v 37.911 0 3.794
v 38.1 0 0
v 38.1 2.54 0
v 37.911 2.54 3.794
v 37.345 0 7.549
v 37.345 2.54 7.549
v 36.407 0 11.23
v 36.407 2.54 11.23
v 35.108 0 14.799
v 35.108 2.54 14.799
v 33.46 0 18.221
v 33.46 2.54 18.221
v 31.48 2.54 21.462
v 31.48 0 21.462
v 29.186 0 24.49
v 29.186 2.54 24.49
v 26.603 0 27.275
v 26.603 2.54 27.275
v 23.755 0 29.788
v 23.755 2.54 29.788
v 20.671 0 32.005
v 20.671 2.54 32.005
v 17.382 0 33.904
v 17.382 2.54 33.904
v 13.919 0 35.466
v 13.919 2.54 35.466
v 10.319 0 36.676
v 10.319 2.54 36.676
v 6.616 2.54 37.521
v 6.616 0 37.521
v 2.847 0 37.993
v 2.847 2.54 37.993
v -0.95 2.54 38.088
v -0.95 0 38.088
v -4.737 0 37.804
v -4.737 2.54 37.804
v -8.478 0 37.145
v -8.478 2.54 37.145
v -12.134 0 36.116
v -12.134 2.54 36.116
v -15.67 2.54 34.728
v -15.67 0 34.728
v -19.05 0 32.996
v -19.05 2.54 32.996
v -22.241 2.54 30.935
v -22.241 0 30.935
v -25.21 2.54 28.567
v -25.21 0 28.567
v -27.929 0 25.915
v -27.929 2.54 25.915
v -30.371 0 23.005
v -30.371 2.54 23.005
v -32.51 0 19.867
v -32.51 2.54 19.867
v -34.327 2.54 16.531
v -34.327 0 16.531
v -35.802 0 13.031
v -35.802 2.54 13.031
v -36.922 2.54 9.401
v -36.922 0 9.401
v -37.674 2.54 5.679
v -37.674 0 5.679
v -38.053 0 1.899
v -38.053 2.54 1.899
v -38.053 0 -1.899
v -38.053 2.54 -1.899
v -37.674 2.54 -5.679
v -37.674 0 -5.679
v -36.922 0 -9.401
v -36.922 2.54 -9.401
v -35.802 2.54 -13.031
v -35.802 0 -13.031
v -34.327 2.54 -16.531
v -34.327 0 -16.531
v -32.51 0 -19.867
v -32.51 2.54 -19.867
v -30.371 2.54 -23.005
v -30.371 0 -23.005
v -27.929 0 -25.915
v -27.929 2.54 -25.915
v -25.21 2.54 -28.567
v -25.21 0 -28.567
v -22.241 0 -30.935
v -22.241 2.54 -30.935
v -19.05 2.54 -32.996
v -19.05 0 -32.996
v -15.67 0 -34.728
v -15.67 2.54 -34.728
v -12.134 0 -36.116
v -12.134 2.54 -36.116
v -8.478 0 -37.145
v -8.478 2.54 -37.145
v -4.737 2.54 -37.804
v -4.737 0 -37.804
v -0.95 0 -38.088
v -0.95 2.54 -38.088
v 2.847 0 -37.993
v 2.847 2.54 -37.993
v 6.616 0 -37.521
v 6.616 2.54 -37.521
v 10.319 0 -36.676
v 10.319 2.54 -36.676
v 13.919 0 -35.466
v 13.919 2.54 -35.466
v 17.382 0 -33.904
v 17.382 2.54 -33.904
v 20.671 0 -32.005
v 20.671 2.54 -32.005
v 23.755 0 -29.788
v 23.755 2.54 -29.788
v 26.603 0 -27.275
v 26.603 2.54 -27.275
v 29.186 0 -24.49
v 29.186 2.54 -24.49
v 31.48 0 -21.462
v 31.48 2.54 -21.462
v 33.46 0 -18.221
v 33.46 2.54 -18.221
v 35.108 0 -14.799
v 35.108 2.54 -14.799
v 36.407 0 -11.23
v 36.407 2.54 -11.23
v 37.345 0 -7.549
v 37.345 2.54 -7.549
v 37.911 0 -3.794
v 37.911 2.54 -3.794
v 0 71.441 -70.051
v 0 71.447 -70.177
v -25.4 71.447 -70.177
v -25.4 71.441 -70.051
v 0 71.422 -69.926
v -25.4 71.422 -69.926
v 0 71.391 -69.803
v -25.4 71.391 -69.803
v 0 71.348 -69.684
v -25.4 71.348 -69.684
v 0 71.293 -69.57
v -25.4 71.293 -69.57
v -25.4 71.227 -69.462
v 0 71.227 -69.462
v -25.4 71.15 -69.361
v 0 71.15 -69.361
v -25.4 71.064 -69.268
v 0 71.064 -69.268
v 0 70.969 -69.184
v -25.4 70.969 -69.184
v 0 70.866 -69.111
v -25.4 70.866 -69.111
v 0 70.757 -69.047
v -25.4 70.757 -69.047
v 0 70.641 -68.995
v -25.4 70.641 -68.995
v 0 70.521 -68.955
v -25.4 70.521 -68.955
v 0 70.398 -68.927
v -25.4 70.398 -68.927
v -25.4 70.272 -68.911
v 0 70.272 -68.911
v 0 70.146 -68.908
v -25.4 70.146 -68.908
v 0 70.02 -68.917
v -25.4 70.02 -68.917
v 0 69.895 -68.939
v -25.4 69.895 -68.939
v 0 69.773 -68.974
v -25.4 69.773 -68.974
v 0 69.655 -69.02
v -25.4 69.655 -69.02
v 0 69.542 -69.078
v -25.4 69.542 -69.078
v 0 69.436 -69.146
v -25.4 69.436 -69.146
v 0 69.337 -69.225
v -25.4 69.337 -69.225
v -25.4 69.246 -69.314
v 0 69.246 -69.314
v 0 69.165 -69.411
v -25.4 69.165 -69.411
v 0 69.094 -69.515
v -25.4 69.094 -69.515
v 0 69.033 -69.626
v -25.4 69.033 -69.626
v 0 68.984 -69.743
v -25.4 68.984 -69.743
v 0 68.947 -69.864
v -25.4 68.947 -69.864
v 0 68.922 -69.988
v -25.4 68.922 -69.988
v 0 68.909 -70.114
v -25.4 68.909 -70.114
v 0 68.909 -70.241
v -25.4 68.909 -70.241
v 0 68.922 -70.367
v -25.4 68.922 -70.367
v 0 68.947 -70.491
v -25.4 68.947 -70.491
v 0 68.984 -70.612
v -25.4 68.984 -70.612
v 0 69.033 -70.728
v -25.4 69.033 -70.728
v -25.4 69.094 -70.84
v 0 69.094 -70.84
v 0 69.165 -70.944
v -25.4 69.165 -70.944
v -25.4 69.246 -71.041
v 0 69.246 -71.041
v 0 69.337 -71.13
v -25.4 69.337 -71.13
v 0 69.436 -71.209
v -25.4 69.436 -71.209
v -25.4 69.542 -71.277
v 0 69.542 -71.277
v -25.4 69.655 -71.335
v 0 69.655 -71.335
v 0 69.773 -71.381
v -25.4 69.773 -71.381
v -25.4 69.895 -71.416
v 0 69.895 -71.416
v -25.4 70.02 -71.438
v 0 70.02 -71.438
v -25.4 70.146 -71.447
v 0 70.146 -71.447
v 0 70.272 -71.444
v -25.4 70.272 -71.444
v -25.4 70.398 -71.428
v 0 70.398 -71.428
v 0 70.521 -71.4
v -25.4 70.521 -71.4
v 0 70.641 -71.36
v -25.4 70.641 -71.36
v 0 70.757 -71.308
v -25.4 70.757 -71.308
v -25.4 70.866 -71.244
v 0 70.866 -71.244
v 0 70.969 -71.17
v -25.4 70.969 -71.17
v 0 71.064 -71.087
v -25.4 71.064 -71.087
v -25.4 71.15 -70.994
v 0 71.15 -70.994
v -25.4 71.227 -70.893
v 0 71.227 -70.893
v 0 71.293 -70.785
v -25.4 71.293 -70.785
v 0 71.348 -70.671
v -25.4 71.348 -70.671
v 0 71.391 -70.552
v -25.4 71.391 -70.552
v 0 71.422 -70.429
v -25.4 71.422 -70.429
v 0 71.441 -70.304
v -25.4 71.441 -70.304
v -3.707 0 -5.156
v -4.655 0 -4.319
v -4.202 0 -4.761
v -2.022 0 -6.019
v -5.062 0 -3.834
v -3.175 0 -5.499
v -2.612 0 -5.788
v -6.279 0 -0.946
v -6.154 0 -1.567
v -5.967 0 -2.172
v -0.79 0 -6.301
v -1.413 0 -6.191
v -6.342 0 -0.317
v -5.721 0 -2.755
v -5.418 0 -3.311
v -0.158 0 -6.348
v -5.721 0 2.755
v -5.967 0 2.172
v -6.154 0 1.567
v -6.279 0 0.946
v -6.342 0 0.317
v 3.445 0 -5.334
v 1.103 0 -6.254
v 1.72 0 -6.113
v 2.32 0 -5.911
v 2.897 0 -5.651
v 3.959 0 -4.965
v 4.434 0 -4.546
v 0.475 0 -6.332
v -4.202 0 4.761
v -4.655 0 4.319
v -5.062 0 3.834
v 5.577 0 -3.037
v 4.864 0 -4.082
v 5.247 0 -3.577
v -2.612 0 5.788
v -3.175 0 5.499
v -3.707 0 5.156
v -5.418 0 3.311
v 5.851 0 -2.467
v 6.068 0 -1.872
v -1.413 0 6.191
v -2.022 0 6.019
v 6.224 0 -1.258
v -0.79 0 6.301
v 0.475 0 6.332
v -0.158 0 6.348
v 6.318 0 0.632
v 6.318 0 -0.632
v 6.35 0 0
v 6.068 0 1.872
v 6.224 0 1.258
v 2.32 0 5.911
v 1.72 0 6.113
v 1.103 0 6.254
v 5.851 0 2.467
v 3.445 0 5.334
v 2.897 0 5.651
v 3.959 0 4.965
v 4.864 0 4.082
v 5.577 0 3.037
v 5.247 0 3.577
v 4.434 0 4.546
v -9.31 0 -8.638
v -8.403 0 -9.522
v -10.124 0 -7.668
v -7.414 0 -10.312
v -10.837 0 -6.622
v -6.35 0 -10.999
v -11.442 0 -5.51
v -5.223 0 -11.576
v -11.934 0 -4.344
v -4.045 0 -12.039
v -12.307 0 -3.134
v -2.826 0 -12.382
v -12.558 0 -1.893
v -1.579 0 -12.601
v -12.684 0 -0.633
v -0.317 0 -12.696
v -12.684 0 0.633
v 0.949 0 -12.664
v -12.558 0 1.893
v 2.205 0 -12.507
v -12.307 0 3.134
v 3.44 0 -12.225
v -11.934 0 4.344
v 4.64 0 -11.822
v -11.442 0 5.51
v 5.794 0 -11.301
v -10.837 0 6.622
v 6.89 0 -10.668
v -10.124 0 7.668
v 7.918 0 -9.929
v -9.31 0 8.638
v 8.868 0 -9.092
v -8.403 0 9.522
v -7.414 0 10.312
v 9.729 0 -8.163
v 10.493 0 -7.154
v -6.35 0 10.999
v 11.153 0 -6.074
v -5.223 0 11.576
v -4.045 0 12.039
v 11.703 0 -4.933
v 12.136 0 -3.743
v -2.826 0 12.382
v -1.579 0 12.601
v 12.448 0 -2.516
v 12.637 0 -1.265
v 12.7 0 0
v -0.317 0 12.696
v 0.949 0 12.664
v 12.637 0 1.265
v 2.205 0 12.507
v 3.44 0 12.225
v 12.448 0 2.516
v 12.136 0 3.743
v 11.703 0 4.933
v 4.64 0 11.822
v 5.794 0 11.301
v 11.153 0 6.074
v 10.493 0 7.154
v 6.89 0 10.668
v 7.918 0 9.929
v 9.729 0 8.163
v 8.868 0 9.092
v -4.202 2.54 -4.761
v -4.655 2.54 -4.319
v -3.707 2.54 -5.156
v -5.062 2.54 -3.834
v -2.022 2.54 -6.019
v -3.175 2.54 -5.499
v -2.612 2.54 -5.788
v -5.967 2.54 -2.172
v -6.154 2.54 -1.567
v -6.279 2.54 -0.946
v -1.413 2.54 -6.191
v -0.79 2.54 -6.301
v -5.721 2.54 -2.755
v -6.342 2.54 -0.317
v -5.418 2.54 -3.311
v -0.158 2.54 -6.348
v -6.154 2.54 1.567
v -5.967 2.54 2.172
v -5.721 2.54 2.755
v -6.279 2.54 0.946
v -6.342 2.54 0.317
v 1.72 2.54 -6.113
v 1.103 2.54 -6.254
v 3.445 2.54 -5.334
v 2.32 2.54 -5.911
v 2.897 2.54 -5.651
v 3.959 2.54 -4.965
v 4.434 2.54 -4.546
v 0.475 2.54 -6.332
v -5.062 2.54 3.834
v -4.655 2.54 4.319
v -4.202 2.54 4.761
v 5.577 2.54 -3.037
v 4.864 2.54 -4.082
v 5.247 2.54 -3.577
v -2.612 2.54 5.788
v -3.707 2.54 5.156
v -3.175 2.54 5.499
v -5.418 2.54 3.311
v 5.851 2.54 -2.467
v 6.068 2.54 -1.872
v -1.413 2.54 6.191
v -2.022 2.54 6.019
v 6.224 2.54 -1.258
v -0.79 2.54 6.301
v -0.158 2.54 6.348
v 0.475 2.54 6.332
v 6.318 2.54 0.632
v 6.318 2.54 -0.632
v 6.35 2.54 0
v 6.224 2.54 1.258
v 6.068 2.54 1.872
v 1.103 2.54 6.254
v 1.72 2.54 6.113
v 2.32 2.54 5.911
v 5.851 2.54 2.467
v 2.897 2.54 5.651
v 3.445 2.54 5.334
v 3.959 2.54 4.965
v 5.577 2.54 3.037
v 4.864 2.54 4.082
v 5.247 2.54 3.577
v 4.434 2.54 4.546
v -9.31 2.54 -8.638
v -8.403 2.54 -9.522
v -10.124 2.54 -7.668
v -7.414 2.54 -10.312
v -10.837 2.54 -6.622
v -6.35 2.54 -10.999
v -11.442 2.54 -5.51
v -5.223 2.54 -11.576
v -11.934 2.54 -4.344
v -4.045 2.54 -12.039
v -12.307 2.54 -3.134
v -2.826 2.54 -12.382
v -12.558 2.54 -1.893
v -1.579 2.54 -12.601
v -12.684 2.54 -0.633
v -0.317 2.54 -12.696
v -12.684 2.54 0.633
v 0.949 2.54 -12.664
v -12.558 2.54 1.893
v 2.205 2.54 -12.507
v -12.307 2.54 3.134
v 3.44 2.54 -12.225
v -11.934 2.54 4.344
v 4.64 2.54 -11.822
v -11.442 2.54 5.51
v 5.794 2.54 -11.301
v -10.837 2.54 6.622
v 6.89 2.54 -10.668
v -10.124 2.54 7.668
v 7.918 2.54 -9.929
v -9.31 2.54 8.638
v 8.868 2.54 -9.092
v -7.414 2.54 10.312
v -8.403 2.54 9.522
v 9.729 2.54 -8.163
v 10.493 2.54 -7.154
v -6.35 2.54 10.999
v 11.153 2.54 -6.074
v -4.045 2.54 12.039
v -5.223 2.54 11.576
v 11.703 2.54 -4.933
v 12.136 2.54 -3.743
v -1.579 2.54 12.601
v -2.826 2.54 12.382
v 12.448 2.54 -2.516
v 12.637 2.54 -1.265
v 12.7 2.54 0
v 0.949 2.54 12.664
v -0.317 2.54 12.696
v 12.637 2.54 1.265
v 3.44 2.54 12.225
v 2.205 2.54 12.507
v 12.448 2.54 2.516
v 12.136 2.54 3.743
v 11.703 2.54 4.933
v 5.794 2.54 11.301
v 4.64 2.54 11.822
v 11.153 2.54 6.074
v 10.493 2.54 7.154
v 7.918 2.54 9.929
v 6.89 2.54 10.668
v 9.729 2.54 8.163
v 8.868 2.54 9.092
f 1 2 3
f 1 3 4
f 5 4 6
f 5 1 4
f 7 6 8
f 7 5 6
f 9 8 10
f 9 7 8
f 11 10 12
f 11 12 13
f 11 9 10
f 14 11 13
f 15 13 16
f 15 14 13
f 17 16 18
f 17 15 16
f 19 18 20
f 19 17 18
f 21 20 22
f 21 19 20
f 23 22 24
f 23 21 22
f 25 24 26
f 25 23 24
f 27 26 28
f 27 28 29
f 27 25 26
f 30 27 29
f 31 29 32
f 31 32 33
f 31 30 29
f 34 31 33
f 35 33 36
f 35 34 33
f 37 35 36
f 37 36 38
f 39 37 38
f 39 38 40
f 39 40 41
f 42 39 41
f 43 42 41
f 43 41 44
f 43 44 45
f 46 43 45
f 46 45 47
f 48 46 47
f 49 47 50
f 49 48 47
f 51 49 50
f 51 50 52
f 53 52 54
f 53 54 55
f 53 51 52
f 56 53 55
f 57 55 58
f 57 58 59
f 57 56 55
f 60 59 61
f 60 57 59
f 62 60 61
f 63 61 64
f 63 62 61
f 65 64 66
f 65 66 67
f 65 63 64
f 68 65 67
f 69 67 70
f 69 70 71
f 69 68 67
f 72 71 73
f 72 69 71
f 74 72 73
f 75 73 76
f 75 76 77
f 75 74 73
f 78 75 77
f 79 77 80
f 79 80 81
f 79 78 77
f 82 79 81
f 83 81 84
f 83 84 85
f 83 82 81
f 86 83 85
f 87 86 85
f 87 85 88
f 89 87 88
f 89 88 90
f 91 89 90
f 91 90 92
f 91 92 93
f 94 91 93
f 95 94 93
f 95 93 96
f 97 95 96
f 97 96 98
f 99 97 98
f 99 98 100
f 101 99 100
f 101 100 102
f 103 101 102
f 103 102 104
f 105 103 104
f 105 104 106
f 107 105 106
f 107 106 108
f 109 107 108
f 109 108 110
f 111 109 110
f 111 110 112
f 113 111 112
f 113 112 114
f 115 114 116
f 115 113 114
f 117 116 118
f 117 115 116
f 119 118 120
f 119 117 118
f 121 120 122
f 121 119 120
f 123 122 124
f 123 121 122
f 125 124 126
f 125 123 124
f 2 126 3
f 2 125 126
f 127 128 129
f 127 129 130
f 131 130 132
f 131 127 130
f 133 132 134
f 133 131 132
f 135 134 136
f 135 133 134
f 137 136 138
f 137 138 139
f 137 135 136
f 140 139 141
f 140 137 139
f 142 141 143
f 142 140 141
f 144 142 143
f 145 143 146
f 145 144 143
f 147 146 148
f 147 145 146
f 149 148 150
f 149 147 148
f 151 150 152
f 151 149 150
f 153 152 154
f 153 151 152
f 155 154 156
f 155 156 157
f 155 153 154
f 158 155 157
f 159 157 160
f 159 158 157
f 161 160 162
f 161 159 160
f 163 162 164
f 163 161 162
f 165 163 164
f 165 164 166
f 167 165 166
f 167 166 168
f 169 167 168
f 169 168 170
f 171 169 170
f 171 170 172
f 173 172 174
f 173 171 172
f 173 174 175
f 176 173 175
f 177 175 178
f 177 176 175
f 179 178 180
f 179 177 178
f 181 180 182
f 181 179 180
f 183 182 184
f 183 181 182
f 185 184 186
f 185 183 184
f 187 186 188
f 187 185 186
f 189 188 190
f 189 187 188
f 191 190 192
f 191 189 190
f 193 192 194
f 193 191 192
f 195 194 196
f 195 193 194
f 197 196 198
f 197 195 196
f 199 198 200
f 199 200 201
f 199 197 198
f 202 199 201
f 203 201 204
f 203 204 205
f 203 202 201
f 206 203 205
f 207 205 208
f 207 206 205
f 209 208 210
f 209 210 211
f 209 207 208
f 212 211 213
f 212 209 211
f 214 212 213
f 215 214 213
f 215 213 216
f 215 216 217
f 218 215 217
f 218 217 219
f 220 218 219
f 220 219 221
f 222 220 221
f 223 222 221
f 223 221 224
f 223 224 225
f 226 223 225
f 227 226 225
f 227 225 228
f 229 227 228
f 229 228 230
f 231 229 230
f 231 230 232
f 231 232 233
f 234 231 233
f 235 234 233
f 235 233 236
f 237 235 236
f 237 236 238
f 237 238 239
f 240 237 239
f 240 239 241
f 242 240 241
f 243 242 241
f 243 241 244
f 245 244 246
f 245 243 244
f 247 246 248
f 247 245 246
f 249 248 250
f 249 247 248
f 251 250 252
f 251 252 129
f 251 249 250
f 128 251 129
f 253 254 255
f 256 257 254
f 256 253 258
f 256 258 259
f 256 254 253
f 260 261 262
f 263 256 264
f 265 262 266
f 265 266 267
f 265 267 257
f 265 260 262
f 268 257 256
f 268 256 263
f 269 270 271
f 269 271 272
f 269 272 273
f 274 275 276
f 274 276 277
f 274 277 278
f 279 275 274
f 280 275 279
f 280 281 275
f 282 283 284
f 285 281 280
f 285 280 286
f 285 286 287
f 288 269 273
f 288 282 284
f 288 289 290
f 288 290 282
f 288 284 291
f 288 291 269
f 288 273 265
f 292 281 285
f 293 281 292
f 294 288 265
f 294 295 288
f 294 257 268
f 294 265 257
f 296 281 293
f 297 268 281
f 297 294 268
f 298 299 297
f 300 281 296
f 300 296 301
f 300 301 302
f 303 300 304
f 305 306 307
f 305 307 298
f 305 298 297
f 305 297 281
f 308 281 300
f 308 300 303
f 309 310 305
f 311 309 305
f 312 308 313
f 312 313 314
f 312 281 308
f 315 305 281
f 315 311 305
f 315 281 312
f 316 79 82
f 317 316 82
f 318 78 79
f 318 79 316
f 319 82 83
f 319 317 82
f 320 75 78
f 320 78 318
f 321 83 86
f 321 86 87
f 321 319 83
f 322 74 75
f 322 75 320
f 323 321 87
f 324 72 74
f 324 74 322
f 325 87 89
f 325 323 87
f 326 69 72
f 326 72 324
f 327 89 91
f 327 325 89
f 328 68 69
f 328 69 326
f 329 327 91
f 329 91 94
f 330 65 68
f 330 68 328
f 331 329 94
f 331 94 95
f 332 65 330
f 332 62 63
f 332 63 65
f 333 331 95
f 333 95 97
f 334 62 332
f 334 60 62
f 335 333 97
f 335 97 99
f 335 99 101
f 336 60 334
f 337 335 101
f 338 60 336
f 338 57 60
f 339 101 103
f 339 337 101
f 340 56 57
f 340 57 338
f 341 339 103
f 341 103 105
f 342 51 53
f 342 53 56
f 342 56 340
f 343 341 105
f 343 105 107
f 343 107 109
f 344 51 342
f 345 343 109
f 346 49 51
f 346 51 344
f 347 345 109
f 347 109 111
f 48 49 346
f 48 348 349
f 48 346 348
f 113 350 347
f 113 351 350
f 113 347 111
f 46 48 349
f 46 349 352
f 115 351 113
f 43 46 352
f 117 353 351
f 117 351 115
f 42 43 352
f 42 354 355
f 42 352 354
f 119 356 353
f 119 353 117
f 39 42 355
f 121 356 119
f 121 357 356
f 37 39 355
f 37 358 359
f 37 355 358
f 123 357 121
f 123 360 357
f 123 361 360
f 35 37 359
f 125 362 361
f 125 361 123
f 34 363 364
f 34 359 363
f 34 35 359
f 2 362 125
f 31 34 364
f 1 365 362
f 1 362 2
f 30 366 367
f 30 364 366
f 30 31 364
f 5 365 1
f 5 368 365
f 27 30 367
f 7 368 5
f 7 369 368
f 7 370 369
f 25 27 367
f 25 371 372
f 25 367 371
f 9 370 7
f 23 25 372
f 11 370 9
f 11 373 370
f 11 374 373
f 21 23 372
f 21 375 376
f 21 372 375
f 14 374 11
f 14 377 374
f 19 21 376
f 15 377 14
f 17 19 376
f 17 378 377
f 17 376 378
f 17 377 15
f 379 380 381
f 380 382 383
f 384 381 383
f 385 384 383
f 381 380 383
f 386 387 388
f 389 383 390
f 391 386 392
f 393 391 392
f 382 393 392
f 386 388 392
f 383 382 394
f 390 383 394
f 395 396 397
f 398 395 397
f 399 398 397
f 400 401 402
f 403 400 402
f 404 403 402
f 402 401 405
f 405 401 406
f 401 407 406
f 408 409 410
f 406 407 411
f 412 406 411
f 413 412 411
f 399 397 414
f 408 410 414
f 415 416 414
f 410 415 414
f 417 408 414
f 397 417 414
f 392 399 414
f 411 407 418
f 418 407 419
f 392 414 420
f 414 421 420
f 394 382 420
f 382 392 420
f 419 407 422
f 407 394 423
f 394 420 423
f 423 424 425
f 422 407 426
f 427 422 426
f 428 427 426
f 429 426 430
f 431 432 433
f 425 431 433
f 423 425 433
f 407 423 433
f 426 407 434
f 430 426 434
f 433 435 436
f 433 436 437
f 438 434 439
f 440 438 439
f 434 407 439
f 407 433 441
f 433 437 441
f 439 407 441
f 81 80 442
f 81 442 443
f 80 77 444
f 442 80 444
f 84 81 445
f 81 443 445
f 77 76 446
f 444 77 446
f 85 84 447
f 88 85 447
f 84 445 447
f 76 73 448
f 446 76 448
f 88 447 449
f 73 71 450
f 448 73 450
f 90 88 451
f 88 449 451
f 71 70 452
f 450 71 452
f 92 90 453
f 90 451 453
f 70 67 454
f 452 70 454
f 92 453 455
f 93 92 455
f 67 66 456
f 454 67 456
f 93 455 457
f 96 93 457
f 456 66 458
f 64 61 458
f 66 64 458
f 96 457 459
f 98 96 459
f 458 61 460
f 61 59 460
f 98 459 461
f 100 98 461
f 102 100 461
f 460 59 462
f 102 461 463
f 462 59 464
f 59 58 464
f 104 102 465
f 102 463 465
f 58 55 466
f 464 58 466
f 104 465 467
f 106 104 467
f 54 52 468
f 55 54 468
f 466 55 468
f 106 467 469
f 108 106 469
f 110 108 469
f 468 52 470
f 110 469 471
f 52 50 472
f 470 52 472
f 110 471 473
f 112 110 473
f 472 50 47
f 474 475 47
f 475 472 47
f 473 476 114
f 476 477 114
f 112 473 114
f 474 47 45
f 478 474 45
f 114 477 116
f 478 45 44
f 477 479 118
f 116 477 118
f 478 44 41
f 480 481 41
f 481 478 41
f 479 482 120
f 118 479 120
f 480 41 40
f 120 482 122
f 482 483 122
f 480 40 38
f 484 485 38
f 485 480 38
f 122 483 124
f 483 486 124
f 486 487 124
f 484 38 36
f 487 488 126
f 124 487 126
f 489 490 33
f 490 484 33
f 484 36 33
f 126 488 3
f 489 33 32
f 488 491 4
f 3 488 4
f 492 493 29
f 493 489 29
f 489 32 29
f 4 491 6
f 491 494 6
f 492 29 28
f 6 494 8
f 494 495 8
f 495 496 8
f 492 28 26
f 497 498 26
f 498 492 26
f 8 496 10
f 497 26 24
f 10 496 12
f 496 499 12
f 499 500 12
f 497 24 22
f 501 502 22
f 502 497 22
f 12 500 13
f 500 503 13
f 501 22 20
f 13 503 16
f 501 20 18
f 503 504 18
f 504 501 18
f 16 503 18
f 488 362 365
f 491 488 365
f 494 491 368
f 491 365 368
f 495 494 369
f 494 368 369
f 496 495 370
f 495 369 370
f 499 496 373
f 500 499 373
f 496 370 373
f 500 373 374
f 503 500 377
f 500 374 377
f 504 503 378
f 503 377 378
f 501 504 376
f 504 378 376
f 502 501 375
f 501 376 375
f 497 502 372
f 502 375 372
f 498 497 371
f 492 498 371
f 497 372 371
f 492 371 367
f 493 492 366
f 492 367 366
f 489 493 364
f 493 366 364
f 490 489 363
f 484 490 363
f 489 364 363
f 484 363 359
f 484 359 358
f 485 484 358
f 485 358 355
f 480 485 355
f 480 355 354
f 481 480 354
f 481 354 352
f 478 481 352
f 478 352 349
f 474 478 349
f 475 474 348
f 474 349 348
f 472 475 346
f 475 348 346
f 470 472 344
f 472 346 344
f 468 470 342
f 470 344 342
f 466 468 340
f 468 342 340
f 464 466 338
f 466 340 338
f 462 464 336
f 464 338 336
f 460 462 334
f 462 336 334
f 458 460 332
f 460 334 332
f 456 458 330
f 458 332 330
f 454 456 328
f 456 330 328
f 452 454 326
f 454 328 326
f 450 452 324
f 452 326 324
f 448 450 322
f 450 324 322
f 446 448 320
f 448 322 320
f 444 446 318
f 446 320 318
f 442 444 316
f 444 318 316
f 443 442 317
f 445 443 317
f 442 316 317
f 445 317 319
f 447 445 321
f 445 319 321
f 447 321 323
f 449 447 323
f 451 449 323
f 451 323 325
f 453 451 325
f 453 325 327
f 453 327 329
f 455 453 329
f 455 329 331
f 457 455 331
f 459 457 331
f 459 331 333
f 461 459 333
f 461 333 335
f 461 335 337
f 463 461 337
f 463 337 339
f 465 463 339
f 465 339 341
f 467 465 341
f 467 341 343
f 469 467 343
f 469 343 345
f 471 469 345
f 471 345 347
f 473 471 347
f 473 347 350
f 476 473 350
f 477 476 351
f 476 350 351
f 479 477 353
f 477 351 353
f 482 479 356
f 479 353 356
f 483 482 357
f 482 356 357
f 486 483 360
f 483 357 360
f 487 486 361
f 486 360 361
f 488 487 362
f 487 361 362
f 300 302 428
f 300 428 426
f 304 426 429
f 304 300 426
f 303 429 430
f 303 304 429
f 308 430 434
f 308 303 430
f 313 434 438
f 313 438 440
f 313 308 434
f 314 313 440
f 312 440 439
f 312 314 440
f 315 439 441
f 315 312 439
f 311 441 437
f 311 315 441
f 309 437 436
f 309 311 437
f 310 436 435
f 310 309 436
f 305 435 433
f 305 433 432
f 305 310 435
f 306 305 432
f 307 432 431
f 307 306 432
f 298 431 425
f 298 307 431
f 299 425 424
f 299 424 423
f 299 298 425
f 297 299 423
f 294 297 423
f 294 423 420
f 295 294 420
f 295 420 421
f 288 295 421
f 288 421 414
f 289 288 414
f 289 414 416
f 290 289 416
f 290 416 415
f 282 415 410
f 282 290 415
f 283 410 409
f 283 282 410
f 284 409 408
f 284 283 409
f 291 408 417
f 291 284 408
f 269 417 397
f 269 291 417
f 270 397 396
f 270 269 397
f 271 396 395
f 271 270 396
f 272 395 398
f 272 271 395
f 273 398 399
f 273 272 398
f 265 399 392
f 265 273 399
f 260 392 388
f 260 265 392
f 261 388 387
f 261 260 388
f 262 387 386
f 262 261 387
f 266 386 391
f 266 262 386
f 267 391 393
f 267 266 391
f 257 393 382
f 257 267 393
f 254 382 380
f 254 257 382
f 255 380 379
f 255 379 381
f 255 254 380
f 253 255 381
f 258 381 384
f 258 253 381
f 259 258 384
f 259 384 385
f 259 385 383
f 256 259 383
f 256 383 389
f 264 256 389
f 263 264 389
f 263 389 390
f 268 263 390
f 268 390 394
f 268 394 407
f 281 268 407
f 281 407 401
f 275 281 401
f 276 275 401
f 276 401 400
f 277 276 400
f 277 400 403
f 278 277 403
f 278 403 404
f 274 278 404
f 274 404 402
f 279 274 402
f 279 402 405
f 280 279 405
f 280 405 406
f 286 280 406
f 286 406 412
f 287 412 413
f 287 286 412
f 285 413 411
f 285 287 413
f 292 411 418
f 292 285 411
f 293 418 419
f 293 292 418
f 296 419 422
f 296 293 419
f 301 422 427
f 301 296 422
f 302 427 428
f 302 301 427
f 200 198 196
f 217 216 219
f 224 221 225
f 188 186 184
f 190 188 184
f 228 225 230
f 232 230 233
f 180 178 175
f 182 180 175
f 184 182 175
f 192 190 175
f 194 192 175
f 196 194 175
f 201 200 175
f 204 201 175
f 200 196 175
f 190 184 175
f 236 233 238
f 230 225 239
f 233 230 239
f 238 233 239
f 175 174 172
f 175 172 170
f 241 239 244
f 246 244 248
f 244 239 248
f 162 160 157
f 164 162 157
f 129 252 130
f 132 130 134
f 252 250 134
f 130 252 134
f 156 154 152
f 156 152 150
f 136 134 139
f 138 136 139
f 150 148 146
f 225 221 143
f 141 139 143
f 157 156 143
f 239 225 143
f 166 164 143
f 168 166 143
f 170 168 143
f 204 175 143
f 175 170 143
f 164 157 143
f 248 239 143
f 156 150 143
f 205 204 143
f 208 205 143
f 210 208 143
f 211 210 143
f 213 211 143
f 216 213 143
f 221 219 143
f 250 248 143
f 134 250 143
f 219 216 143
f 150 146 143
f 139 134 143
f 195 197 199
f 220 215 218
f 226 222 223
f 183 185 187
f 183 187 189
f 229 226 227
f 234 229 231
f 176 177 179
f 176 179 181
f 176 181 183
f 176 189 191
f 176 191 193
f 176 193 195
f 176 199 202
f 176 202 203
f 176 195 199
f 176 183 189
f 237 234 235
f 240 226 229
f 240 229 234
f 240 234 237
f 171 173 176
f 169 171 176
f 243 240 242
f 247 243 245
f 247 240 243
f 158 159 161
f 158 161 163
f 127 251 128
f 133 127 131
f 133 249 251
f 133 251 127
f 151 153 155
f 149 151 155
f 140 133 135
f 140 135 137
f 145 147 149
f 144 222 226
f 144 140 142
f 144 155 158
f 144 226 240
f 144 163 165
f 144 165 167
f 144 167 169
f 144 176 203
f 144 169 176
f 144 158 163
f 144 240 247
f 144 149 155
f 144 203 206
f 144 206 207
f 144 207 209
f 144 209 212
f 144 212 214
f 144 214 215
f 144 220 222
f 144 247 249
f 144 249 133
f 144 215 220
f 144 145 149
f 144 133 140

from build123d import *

# Parameters (mm, degrees)
F0_R     = 38.1
F0_R_2   = 12.7
F0_R_3   = 6.35
F1_DEPTH = 2.54
F2_R     = 1.27
F3_DEPTH = 25.4


with BuildPart() as f1:
    # F0 (on Front) → F1 (new body)
    with BuildSketch(Plane.XZ):
        Circle(F0_R)
        Circle(F0_R_2, mode=Mode.SUBTRACT)
        Circle(F0_R_3)
    extrude(amount=-F1_DEPTH)


with BuildPart() as f3:
    # F2 (on Right) → F3 (new body)
    with BuildSketch(Plane.YZ):
        with Locations((70.177451, -70.177384)):
            Circle(F2_R)
    extrude(amount=-F3_DEPTH)


solid = Compound([f1.part, f3.part])
